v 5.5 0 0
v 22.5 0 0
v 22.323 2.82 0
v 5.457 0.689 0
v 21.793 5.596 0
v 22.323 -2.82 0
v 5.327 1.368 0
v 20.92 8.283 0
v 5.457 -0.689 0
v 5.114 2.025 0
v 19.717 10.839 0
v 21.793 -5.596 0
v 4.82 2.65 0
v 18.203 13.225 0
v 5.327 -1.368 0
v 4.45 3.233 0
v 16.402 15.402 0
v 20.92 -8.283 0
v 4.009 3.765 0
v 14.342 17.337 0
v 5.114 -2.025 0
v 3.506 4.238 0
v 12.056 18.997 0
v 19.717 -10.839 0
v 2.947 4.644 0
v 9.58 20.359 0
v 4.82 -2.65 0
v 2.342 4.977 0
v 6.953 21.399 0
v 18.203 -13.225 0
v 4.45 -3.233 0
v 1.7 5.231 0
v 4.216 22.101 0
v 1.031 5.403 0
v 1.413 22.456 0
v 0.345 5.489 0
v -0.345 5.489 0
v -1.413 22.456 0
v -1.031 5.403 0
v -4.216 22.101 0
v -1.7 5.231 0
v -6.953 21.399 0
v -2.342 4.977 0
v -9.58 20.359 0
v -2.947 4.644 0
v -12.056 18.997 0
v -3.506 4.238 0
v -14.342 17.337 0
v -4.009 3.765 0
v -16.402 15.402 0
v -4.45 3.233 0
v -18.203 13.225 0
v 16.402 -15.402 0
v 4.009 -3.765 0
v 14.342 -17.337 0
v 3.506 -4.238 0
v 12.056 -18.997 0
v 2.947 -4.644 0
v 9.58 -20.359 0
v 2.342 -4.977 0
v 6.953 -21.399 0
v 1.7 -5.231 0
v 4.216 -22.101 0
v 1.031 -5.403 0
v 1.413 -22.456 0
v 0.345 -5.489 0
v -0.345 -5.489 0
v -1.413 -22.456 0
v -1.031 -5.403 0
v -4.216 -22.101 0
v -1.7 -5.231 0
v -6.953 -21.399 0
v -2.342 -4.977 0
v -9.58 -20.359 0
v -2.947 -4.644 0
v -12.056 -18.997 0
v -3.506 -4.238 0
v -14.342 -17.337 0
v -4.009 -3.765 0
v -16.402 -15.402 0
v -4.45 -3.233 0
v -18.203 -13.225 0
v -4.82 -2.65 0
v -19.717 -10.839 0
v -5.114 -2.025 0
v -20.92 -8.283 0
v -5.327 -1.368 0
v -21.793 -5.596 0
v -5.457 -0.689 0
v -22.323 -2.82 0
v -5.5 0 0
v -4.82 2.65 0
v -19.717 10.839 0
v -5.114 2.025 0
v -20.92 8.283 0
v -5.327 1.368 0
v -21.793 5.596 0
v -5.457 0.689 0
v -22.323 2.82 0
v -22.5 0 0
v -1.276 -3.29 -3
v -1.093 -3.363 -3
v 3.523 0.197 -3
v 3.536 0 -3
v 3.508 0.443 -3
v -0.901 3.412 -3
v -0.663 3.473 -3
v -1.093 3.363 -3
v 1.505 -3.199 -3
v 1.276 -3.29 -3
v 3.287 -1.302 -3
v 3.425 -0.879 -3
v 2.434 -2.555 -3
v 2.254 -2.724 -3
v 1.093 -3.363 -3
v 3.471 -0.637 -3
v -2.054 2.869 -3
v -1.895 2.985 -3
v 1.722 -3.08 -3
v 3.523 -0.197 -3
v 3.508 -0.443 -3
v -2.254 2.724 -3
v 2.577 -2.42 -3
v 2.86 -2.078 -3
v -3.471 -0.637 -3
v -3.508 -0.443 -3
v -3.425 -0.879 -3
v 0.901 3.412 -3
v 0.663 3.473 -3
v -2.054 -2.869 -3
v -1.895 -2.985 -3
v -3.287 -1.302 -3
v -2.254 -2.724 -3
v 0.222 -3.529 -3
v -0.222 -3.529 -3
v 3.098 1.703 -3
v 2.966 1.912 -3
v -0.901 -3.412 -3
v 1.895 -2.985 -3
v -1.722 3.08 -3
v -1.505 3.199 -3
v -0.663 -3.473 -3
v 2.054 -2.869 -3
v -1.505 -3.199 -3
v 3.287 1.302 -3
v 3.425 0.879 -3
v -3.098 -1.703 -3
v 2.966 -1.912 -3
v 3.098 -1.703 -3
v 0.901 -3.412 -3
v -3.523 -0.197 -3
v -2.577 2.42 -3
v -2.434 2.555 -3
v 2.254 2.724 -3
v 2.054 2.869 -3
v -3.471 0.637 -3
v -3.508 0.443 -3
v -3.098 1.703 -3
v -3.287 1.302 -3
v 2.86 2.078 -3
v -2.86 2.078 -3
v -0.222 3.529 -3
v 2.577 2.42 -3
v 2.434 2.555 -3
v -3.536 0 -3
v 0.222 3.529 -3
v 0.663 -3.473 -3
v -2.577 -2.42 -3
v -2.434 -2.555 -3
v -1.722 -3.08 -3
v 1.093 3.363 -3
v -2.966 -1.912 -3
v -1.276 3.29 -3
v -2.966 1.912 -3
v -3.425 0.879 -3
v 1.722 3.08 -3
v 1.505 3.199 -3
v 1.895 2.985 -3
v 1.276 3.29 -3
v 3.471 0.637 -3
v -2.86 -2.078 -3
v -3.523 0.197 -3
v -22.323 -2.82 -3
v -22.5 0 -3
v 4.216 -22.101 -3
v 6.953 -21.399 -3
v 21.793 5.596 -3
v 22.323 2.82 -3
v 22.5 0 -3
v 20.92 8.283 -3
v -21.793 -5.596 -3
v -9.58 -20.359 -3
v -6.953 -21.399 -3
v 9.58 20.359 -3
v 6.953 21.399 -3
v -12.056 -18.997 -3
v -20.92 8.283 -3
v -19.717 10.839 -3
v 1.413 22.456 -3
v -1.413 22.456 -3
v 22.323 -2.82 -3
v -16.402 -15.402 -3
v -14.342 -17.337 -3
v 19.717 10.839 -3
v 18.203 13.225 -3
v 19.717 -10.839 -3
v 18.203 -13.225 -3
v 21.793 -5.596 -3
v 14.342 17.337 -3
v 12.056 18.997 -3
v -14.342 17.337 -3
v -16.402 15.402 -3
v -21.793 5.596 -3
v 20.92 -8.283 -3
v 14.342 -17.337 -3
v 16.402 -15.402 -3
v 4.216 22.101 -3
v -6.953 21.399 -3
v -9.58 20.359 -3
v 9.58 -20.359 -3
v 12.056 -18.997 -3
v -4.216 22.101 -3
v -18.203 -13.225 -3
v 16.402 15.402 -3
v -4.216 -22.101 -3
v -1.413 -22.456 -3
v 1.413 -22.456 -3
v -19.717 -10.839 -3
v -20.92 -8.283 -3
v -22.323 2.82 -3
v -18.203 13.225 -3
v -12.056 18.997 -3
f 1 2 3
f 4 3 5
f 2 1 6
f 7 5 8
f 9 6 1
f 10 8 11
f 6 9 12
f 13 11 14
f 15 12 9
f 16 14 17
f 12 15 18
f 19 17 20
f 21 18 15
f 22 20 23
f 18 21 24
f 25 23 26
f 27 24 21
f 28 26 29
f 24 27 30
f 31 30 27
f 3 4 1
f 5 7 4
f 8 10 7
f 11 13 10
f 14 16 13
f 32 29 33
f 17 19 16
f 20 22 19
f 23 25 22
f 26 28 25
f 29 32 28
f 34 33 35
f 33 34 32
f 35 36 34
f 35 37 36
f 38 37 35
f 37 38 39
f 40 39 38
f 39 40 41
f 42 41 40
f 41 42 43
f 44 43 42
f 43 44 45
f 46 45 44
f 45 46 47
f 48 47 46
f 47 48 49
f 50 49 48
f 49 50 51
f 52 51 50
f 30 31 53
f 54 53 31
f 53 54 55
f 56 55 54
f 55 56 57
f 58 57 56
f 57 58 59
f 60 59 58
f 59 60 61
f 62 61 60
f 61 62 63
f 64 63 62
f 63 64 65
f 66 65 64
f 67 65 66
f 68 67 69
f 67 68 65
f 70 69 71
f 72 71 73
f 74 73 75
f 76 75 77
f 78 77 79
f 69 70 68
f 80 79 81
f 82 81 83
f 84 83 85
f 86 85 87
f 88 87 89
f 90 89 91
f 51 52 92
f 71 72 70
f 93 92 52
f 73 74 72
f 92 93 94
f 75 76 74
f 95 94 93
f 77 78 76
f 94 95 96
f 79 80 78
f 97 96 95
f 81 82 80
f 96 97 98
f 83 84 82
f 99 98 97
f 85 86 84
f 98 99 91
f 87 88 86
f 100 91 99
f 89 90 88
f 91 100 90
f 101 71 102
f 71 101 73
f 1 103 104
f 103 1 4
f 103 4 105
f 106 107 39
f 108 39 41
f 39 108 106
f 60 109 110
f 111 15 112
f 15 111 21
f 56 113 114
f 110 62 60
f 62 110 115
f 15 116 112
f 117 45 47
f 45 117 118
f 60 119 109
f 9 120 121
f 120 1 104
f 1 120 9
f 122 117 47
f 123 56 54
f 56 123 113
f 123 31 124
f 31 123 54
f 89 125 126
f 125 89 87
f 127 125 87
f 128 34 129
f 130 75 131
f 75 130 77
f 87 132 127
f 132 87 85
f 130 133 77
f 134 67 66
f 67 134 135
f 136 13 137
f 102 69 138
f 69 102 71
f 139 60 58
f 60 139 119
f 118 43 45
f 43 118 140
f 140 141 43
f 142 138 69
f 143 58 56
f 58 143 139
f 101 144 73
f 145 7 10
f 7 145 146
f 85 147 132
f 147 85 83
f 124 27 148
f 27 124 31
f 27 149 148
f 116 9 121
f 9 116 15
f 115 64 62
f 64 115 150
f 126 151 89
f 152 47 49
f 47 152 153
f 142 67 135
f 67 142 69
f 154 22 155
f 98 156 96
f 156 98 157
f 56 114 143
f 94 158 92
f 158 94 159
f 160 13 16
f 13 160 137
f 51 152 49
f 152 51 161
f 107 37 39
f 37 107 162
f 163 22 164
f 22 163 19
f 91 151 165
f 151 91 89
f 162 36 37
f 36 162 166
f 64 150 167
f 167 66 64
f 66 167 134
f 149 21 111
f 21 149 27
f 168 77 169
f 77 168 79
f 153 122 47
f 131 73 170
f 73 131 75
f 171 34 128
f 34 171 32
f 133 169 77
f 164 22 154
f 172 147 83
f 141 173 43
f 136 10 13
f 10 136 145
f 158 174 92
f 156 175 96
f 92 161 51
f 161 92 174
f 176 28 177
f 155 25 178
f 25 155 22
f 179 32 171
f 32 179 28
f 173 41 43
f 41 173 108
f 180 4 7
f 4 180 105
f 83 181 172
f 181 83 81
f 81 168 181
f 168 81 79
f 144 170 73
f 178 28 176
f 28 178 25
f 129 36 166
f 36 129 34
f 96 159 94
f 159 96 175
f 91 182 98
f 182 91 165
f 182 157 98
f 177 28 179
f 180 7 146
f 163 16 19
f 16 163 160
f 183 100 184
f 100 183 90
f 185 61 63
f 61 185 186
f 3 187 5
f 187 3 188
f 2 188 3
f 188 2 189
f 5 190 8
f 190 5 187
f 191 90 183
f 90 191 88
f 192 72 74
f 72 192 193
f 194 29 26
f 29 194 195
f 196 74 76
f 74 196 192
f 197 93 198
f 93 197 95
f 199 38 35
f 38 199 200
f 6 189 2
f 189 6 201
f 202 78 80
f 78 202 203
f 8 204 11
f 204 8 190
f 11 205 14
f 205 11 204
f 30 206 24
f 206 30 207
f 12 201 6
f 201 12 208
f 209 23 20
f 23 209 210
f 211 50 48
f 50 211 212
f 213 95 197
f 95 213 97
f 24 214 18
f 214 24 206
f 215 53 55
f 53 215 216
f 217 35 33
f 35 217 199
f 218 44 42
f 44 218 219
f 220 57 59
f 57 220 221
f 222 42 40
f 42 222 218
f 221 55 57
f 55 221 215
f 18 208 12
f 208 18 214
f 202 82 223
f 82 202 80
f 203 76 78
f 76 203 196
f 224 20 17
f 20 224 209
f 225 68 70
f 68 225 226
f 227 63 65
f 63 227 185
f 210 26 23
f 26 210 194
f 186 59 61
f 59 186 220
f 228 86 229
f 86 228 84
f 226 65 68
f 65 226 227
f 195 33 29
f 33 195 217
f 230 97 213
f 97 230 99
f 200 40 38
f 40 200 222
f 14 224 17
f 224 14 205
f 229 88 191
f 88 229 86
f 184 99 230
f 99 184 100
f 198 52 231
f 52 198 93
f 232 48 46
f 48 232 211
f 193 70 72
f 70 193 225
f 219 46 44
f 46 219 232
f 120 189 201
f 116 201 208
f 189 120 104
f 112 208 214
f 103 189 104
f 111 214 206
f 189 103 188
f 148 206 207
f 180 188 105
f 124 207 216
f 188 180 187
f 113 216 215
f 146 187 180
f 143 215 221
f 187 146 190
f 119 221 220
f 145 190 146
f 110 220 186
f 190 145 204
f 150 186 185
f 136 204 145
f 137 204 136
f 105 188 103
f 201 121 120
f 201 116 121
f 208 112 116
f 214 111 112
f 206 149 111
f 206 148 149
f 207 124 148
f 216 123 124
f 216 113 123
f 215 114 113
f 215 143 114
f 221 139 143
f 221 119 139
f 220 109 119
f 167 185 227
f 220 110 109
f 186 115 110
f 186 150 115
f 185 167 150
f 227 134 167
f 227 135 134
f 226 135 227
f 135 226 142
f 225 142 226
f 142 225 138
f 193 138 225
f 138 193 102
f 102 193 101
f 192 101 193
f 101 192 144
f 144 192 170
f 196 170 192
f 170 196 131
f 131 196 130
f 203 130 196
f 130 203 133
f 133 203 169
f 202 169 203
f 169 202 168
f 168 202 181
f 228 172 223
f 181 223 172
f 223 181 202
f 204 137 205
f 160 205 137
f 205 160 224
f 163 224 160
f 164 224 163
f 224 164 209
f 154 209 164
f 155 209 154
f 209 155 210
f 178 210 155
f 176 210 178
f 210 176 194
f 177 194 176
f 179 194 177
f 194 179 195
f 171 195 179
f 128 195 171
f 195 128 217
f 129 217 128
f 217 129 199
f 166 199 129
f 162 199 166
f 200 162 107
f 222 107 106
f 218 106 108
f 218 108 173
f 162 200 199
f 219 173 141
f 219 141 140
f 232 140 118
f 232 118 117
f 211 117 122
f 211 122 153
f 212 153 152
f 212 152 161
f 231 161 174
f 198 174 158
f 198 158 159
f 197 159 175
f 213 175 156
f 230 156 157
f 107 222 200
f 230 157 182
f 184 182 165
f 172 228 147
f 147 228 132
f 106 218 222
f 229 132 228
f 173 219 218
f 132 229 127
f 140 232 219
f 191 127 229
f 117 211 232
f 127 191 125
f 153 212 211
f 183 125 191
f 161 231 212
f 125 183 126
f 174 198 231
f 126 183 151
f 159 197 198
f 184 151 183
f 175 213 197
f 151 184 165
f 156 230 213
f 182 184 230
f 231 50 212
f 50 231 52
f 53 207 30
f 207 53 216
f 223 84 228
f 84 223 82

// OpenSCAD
$fn = 50;

difference() {
	union() {
		translate(v = [0, 0, -3.0]) {
			cylinder(h = 3, r = 22.5);
		}
	}
	union() {
		translate(v = [0, 0, 0]) {
			rotate(a = [0, 0, 0]) {
				difference() {
					union() {
						translate(v = [0, 0, -6.0]) {
							cylinder(h = 6, r = 2.25);
						}
						translate(v = [0, 0, -4.2]) {
							cylinder(h = 4.2, r1 = 2.75, r2 = 5.5);
						}
						translate(v = [0, 0, -6.0]) {
							cylinder(h = 6, r = 2.75);
						}
						translate(v = [0, 0, -6.0]) {
							cylinder(h = 6, r = 2.25);
						}
					}
					union();
				}
			}
		}
	}
}
